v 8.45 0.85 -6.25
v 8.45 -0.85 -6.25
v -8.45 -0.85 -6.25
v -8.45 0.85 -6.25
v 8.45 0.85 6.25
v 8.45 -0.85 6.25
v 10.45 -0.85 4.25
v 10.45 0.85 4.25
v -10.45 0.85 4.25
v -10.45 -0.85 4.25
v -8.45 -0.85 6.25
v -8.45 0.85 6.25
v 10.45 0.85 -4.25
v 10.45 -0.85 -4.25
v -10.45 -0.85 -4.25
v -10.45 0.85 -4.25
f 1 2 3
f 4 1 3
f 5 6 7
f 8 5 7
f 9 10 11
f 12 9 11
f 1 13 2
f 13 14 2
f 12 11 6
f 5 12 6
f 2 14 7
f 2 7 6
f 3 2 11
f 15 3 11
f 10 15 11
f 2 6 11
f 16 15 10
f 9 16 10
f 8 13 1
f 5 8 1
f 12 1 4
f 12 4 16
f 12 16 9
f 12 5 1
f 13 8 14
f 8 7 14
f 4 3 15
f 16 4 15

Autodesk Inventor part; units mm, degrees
ref_plane "YZ Plane" through (0, 0, 0) normal (1, 0, 0) x (0, 1, 0)
ref_plane "XZ Plane" through (0, 0, 0) normal (0, 1, 0) x (-1, 0, 0)
ref_plane "XY Plane" through (0, 0, 0) normal (0, 0, 1) x (1, 0, 0)
sketch "Sketch1" plane through (0, 0, 0) normal (0, 1, 0) x (-1, 0, 0)
  line L0 (8.45, 6.25) -> (-8.45, 6.25)
  line L1 (-10.45, 4.25) -> (-10.45, -4.25)
  line L2 (-8.45, -6.25) -> (8.45, -6.25)
  line L3 (10.45, -4.25) -> (10.45, 4.25)
  line L4 (10.45, 6.25) -> (-10.45, -6.25) construction
  line L5 (-10.45, 6.25) -> (10.45, -6.25) construction
  line L6 (8.45, -6.25) -> (10.45, -4.25)
  line L7 (10.45, 4.25) -> (8.45, 6.25)
  line L8 (-8.45, 6.25) -> (-10.45, 4.25)
  line L9 (-10.45, -4.25) -> (-8.45, -6.25)
  point P0 (0, 0)
  dimension "d0" = 20.9
  dimension "d1" = 12.5
  dimension "d2" = 2
  dimension "d3" = 2
extrude "Extrusion1" add sketch "Sketch1" along normal mid plane 1.7
equation "\"d0\" = CMWidth"
equation "\"d1\" = CMLength"
equation "\"d2\" = CMChamfer"
equation "\"d3\" = d2"
equation "\"CMWidth\" = 20.9"
equation "\"CMLength\" = 12.5"
equation "\"CMChamfer\" = 2"
properties part number "ControlMarker_Single" material "Paper"
